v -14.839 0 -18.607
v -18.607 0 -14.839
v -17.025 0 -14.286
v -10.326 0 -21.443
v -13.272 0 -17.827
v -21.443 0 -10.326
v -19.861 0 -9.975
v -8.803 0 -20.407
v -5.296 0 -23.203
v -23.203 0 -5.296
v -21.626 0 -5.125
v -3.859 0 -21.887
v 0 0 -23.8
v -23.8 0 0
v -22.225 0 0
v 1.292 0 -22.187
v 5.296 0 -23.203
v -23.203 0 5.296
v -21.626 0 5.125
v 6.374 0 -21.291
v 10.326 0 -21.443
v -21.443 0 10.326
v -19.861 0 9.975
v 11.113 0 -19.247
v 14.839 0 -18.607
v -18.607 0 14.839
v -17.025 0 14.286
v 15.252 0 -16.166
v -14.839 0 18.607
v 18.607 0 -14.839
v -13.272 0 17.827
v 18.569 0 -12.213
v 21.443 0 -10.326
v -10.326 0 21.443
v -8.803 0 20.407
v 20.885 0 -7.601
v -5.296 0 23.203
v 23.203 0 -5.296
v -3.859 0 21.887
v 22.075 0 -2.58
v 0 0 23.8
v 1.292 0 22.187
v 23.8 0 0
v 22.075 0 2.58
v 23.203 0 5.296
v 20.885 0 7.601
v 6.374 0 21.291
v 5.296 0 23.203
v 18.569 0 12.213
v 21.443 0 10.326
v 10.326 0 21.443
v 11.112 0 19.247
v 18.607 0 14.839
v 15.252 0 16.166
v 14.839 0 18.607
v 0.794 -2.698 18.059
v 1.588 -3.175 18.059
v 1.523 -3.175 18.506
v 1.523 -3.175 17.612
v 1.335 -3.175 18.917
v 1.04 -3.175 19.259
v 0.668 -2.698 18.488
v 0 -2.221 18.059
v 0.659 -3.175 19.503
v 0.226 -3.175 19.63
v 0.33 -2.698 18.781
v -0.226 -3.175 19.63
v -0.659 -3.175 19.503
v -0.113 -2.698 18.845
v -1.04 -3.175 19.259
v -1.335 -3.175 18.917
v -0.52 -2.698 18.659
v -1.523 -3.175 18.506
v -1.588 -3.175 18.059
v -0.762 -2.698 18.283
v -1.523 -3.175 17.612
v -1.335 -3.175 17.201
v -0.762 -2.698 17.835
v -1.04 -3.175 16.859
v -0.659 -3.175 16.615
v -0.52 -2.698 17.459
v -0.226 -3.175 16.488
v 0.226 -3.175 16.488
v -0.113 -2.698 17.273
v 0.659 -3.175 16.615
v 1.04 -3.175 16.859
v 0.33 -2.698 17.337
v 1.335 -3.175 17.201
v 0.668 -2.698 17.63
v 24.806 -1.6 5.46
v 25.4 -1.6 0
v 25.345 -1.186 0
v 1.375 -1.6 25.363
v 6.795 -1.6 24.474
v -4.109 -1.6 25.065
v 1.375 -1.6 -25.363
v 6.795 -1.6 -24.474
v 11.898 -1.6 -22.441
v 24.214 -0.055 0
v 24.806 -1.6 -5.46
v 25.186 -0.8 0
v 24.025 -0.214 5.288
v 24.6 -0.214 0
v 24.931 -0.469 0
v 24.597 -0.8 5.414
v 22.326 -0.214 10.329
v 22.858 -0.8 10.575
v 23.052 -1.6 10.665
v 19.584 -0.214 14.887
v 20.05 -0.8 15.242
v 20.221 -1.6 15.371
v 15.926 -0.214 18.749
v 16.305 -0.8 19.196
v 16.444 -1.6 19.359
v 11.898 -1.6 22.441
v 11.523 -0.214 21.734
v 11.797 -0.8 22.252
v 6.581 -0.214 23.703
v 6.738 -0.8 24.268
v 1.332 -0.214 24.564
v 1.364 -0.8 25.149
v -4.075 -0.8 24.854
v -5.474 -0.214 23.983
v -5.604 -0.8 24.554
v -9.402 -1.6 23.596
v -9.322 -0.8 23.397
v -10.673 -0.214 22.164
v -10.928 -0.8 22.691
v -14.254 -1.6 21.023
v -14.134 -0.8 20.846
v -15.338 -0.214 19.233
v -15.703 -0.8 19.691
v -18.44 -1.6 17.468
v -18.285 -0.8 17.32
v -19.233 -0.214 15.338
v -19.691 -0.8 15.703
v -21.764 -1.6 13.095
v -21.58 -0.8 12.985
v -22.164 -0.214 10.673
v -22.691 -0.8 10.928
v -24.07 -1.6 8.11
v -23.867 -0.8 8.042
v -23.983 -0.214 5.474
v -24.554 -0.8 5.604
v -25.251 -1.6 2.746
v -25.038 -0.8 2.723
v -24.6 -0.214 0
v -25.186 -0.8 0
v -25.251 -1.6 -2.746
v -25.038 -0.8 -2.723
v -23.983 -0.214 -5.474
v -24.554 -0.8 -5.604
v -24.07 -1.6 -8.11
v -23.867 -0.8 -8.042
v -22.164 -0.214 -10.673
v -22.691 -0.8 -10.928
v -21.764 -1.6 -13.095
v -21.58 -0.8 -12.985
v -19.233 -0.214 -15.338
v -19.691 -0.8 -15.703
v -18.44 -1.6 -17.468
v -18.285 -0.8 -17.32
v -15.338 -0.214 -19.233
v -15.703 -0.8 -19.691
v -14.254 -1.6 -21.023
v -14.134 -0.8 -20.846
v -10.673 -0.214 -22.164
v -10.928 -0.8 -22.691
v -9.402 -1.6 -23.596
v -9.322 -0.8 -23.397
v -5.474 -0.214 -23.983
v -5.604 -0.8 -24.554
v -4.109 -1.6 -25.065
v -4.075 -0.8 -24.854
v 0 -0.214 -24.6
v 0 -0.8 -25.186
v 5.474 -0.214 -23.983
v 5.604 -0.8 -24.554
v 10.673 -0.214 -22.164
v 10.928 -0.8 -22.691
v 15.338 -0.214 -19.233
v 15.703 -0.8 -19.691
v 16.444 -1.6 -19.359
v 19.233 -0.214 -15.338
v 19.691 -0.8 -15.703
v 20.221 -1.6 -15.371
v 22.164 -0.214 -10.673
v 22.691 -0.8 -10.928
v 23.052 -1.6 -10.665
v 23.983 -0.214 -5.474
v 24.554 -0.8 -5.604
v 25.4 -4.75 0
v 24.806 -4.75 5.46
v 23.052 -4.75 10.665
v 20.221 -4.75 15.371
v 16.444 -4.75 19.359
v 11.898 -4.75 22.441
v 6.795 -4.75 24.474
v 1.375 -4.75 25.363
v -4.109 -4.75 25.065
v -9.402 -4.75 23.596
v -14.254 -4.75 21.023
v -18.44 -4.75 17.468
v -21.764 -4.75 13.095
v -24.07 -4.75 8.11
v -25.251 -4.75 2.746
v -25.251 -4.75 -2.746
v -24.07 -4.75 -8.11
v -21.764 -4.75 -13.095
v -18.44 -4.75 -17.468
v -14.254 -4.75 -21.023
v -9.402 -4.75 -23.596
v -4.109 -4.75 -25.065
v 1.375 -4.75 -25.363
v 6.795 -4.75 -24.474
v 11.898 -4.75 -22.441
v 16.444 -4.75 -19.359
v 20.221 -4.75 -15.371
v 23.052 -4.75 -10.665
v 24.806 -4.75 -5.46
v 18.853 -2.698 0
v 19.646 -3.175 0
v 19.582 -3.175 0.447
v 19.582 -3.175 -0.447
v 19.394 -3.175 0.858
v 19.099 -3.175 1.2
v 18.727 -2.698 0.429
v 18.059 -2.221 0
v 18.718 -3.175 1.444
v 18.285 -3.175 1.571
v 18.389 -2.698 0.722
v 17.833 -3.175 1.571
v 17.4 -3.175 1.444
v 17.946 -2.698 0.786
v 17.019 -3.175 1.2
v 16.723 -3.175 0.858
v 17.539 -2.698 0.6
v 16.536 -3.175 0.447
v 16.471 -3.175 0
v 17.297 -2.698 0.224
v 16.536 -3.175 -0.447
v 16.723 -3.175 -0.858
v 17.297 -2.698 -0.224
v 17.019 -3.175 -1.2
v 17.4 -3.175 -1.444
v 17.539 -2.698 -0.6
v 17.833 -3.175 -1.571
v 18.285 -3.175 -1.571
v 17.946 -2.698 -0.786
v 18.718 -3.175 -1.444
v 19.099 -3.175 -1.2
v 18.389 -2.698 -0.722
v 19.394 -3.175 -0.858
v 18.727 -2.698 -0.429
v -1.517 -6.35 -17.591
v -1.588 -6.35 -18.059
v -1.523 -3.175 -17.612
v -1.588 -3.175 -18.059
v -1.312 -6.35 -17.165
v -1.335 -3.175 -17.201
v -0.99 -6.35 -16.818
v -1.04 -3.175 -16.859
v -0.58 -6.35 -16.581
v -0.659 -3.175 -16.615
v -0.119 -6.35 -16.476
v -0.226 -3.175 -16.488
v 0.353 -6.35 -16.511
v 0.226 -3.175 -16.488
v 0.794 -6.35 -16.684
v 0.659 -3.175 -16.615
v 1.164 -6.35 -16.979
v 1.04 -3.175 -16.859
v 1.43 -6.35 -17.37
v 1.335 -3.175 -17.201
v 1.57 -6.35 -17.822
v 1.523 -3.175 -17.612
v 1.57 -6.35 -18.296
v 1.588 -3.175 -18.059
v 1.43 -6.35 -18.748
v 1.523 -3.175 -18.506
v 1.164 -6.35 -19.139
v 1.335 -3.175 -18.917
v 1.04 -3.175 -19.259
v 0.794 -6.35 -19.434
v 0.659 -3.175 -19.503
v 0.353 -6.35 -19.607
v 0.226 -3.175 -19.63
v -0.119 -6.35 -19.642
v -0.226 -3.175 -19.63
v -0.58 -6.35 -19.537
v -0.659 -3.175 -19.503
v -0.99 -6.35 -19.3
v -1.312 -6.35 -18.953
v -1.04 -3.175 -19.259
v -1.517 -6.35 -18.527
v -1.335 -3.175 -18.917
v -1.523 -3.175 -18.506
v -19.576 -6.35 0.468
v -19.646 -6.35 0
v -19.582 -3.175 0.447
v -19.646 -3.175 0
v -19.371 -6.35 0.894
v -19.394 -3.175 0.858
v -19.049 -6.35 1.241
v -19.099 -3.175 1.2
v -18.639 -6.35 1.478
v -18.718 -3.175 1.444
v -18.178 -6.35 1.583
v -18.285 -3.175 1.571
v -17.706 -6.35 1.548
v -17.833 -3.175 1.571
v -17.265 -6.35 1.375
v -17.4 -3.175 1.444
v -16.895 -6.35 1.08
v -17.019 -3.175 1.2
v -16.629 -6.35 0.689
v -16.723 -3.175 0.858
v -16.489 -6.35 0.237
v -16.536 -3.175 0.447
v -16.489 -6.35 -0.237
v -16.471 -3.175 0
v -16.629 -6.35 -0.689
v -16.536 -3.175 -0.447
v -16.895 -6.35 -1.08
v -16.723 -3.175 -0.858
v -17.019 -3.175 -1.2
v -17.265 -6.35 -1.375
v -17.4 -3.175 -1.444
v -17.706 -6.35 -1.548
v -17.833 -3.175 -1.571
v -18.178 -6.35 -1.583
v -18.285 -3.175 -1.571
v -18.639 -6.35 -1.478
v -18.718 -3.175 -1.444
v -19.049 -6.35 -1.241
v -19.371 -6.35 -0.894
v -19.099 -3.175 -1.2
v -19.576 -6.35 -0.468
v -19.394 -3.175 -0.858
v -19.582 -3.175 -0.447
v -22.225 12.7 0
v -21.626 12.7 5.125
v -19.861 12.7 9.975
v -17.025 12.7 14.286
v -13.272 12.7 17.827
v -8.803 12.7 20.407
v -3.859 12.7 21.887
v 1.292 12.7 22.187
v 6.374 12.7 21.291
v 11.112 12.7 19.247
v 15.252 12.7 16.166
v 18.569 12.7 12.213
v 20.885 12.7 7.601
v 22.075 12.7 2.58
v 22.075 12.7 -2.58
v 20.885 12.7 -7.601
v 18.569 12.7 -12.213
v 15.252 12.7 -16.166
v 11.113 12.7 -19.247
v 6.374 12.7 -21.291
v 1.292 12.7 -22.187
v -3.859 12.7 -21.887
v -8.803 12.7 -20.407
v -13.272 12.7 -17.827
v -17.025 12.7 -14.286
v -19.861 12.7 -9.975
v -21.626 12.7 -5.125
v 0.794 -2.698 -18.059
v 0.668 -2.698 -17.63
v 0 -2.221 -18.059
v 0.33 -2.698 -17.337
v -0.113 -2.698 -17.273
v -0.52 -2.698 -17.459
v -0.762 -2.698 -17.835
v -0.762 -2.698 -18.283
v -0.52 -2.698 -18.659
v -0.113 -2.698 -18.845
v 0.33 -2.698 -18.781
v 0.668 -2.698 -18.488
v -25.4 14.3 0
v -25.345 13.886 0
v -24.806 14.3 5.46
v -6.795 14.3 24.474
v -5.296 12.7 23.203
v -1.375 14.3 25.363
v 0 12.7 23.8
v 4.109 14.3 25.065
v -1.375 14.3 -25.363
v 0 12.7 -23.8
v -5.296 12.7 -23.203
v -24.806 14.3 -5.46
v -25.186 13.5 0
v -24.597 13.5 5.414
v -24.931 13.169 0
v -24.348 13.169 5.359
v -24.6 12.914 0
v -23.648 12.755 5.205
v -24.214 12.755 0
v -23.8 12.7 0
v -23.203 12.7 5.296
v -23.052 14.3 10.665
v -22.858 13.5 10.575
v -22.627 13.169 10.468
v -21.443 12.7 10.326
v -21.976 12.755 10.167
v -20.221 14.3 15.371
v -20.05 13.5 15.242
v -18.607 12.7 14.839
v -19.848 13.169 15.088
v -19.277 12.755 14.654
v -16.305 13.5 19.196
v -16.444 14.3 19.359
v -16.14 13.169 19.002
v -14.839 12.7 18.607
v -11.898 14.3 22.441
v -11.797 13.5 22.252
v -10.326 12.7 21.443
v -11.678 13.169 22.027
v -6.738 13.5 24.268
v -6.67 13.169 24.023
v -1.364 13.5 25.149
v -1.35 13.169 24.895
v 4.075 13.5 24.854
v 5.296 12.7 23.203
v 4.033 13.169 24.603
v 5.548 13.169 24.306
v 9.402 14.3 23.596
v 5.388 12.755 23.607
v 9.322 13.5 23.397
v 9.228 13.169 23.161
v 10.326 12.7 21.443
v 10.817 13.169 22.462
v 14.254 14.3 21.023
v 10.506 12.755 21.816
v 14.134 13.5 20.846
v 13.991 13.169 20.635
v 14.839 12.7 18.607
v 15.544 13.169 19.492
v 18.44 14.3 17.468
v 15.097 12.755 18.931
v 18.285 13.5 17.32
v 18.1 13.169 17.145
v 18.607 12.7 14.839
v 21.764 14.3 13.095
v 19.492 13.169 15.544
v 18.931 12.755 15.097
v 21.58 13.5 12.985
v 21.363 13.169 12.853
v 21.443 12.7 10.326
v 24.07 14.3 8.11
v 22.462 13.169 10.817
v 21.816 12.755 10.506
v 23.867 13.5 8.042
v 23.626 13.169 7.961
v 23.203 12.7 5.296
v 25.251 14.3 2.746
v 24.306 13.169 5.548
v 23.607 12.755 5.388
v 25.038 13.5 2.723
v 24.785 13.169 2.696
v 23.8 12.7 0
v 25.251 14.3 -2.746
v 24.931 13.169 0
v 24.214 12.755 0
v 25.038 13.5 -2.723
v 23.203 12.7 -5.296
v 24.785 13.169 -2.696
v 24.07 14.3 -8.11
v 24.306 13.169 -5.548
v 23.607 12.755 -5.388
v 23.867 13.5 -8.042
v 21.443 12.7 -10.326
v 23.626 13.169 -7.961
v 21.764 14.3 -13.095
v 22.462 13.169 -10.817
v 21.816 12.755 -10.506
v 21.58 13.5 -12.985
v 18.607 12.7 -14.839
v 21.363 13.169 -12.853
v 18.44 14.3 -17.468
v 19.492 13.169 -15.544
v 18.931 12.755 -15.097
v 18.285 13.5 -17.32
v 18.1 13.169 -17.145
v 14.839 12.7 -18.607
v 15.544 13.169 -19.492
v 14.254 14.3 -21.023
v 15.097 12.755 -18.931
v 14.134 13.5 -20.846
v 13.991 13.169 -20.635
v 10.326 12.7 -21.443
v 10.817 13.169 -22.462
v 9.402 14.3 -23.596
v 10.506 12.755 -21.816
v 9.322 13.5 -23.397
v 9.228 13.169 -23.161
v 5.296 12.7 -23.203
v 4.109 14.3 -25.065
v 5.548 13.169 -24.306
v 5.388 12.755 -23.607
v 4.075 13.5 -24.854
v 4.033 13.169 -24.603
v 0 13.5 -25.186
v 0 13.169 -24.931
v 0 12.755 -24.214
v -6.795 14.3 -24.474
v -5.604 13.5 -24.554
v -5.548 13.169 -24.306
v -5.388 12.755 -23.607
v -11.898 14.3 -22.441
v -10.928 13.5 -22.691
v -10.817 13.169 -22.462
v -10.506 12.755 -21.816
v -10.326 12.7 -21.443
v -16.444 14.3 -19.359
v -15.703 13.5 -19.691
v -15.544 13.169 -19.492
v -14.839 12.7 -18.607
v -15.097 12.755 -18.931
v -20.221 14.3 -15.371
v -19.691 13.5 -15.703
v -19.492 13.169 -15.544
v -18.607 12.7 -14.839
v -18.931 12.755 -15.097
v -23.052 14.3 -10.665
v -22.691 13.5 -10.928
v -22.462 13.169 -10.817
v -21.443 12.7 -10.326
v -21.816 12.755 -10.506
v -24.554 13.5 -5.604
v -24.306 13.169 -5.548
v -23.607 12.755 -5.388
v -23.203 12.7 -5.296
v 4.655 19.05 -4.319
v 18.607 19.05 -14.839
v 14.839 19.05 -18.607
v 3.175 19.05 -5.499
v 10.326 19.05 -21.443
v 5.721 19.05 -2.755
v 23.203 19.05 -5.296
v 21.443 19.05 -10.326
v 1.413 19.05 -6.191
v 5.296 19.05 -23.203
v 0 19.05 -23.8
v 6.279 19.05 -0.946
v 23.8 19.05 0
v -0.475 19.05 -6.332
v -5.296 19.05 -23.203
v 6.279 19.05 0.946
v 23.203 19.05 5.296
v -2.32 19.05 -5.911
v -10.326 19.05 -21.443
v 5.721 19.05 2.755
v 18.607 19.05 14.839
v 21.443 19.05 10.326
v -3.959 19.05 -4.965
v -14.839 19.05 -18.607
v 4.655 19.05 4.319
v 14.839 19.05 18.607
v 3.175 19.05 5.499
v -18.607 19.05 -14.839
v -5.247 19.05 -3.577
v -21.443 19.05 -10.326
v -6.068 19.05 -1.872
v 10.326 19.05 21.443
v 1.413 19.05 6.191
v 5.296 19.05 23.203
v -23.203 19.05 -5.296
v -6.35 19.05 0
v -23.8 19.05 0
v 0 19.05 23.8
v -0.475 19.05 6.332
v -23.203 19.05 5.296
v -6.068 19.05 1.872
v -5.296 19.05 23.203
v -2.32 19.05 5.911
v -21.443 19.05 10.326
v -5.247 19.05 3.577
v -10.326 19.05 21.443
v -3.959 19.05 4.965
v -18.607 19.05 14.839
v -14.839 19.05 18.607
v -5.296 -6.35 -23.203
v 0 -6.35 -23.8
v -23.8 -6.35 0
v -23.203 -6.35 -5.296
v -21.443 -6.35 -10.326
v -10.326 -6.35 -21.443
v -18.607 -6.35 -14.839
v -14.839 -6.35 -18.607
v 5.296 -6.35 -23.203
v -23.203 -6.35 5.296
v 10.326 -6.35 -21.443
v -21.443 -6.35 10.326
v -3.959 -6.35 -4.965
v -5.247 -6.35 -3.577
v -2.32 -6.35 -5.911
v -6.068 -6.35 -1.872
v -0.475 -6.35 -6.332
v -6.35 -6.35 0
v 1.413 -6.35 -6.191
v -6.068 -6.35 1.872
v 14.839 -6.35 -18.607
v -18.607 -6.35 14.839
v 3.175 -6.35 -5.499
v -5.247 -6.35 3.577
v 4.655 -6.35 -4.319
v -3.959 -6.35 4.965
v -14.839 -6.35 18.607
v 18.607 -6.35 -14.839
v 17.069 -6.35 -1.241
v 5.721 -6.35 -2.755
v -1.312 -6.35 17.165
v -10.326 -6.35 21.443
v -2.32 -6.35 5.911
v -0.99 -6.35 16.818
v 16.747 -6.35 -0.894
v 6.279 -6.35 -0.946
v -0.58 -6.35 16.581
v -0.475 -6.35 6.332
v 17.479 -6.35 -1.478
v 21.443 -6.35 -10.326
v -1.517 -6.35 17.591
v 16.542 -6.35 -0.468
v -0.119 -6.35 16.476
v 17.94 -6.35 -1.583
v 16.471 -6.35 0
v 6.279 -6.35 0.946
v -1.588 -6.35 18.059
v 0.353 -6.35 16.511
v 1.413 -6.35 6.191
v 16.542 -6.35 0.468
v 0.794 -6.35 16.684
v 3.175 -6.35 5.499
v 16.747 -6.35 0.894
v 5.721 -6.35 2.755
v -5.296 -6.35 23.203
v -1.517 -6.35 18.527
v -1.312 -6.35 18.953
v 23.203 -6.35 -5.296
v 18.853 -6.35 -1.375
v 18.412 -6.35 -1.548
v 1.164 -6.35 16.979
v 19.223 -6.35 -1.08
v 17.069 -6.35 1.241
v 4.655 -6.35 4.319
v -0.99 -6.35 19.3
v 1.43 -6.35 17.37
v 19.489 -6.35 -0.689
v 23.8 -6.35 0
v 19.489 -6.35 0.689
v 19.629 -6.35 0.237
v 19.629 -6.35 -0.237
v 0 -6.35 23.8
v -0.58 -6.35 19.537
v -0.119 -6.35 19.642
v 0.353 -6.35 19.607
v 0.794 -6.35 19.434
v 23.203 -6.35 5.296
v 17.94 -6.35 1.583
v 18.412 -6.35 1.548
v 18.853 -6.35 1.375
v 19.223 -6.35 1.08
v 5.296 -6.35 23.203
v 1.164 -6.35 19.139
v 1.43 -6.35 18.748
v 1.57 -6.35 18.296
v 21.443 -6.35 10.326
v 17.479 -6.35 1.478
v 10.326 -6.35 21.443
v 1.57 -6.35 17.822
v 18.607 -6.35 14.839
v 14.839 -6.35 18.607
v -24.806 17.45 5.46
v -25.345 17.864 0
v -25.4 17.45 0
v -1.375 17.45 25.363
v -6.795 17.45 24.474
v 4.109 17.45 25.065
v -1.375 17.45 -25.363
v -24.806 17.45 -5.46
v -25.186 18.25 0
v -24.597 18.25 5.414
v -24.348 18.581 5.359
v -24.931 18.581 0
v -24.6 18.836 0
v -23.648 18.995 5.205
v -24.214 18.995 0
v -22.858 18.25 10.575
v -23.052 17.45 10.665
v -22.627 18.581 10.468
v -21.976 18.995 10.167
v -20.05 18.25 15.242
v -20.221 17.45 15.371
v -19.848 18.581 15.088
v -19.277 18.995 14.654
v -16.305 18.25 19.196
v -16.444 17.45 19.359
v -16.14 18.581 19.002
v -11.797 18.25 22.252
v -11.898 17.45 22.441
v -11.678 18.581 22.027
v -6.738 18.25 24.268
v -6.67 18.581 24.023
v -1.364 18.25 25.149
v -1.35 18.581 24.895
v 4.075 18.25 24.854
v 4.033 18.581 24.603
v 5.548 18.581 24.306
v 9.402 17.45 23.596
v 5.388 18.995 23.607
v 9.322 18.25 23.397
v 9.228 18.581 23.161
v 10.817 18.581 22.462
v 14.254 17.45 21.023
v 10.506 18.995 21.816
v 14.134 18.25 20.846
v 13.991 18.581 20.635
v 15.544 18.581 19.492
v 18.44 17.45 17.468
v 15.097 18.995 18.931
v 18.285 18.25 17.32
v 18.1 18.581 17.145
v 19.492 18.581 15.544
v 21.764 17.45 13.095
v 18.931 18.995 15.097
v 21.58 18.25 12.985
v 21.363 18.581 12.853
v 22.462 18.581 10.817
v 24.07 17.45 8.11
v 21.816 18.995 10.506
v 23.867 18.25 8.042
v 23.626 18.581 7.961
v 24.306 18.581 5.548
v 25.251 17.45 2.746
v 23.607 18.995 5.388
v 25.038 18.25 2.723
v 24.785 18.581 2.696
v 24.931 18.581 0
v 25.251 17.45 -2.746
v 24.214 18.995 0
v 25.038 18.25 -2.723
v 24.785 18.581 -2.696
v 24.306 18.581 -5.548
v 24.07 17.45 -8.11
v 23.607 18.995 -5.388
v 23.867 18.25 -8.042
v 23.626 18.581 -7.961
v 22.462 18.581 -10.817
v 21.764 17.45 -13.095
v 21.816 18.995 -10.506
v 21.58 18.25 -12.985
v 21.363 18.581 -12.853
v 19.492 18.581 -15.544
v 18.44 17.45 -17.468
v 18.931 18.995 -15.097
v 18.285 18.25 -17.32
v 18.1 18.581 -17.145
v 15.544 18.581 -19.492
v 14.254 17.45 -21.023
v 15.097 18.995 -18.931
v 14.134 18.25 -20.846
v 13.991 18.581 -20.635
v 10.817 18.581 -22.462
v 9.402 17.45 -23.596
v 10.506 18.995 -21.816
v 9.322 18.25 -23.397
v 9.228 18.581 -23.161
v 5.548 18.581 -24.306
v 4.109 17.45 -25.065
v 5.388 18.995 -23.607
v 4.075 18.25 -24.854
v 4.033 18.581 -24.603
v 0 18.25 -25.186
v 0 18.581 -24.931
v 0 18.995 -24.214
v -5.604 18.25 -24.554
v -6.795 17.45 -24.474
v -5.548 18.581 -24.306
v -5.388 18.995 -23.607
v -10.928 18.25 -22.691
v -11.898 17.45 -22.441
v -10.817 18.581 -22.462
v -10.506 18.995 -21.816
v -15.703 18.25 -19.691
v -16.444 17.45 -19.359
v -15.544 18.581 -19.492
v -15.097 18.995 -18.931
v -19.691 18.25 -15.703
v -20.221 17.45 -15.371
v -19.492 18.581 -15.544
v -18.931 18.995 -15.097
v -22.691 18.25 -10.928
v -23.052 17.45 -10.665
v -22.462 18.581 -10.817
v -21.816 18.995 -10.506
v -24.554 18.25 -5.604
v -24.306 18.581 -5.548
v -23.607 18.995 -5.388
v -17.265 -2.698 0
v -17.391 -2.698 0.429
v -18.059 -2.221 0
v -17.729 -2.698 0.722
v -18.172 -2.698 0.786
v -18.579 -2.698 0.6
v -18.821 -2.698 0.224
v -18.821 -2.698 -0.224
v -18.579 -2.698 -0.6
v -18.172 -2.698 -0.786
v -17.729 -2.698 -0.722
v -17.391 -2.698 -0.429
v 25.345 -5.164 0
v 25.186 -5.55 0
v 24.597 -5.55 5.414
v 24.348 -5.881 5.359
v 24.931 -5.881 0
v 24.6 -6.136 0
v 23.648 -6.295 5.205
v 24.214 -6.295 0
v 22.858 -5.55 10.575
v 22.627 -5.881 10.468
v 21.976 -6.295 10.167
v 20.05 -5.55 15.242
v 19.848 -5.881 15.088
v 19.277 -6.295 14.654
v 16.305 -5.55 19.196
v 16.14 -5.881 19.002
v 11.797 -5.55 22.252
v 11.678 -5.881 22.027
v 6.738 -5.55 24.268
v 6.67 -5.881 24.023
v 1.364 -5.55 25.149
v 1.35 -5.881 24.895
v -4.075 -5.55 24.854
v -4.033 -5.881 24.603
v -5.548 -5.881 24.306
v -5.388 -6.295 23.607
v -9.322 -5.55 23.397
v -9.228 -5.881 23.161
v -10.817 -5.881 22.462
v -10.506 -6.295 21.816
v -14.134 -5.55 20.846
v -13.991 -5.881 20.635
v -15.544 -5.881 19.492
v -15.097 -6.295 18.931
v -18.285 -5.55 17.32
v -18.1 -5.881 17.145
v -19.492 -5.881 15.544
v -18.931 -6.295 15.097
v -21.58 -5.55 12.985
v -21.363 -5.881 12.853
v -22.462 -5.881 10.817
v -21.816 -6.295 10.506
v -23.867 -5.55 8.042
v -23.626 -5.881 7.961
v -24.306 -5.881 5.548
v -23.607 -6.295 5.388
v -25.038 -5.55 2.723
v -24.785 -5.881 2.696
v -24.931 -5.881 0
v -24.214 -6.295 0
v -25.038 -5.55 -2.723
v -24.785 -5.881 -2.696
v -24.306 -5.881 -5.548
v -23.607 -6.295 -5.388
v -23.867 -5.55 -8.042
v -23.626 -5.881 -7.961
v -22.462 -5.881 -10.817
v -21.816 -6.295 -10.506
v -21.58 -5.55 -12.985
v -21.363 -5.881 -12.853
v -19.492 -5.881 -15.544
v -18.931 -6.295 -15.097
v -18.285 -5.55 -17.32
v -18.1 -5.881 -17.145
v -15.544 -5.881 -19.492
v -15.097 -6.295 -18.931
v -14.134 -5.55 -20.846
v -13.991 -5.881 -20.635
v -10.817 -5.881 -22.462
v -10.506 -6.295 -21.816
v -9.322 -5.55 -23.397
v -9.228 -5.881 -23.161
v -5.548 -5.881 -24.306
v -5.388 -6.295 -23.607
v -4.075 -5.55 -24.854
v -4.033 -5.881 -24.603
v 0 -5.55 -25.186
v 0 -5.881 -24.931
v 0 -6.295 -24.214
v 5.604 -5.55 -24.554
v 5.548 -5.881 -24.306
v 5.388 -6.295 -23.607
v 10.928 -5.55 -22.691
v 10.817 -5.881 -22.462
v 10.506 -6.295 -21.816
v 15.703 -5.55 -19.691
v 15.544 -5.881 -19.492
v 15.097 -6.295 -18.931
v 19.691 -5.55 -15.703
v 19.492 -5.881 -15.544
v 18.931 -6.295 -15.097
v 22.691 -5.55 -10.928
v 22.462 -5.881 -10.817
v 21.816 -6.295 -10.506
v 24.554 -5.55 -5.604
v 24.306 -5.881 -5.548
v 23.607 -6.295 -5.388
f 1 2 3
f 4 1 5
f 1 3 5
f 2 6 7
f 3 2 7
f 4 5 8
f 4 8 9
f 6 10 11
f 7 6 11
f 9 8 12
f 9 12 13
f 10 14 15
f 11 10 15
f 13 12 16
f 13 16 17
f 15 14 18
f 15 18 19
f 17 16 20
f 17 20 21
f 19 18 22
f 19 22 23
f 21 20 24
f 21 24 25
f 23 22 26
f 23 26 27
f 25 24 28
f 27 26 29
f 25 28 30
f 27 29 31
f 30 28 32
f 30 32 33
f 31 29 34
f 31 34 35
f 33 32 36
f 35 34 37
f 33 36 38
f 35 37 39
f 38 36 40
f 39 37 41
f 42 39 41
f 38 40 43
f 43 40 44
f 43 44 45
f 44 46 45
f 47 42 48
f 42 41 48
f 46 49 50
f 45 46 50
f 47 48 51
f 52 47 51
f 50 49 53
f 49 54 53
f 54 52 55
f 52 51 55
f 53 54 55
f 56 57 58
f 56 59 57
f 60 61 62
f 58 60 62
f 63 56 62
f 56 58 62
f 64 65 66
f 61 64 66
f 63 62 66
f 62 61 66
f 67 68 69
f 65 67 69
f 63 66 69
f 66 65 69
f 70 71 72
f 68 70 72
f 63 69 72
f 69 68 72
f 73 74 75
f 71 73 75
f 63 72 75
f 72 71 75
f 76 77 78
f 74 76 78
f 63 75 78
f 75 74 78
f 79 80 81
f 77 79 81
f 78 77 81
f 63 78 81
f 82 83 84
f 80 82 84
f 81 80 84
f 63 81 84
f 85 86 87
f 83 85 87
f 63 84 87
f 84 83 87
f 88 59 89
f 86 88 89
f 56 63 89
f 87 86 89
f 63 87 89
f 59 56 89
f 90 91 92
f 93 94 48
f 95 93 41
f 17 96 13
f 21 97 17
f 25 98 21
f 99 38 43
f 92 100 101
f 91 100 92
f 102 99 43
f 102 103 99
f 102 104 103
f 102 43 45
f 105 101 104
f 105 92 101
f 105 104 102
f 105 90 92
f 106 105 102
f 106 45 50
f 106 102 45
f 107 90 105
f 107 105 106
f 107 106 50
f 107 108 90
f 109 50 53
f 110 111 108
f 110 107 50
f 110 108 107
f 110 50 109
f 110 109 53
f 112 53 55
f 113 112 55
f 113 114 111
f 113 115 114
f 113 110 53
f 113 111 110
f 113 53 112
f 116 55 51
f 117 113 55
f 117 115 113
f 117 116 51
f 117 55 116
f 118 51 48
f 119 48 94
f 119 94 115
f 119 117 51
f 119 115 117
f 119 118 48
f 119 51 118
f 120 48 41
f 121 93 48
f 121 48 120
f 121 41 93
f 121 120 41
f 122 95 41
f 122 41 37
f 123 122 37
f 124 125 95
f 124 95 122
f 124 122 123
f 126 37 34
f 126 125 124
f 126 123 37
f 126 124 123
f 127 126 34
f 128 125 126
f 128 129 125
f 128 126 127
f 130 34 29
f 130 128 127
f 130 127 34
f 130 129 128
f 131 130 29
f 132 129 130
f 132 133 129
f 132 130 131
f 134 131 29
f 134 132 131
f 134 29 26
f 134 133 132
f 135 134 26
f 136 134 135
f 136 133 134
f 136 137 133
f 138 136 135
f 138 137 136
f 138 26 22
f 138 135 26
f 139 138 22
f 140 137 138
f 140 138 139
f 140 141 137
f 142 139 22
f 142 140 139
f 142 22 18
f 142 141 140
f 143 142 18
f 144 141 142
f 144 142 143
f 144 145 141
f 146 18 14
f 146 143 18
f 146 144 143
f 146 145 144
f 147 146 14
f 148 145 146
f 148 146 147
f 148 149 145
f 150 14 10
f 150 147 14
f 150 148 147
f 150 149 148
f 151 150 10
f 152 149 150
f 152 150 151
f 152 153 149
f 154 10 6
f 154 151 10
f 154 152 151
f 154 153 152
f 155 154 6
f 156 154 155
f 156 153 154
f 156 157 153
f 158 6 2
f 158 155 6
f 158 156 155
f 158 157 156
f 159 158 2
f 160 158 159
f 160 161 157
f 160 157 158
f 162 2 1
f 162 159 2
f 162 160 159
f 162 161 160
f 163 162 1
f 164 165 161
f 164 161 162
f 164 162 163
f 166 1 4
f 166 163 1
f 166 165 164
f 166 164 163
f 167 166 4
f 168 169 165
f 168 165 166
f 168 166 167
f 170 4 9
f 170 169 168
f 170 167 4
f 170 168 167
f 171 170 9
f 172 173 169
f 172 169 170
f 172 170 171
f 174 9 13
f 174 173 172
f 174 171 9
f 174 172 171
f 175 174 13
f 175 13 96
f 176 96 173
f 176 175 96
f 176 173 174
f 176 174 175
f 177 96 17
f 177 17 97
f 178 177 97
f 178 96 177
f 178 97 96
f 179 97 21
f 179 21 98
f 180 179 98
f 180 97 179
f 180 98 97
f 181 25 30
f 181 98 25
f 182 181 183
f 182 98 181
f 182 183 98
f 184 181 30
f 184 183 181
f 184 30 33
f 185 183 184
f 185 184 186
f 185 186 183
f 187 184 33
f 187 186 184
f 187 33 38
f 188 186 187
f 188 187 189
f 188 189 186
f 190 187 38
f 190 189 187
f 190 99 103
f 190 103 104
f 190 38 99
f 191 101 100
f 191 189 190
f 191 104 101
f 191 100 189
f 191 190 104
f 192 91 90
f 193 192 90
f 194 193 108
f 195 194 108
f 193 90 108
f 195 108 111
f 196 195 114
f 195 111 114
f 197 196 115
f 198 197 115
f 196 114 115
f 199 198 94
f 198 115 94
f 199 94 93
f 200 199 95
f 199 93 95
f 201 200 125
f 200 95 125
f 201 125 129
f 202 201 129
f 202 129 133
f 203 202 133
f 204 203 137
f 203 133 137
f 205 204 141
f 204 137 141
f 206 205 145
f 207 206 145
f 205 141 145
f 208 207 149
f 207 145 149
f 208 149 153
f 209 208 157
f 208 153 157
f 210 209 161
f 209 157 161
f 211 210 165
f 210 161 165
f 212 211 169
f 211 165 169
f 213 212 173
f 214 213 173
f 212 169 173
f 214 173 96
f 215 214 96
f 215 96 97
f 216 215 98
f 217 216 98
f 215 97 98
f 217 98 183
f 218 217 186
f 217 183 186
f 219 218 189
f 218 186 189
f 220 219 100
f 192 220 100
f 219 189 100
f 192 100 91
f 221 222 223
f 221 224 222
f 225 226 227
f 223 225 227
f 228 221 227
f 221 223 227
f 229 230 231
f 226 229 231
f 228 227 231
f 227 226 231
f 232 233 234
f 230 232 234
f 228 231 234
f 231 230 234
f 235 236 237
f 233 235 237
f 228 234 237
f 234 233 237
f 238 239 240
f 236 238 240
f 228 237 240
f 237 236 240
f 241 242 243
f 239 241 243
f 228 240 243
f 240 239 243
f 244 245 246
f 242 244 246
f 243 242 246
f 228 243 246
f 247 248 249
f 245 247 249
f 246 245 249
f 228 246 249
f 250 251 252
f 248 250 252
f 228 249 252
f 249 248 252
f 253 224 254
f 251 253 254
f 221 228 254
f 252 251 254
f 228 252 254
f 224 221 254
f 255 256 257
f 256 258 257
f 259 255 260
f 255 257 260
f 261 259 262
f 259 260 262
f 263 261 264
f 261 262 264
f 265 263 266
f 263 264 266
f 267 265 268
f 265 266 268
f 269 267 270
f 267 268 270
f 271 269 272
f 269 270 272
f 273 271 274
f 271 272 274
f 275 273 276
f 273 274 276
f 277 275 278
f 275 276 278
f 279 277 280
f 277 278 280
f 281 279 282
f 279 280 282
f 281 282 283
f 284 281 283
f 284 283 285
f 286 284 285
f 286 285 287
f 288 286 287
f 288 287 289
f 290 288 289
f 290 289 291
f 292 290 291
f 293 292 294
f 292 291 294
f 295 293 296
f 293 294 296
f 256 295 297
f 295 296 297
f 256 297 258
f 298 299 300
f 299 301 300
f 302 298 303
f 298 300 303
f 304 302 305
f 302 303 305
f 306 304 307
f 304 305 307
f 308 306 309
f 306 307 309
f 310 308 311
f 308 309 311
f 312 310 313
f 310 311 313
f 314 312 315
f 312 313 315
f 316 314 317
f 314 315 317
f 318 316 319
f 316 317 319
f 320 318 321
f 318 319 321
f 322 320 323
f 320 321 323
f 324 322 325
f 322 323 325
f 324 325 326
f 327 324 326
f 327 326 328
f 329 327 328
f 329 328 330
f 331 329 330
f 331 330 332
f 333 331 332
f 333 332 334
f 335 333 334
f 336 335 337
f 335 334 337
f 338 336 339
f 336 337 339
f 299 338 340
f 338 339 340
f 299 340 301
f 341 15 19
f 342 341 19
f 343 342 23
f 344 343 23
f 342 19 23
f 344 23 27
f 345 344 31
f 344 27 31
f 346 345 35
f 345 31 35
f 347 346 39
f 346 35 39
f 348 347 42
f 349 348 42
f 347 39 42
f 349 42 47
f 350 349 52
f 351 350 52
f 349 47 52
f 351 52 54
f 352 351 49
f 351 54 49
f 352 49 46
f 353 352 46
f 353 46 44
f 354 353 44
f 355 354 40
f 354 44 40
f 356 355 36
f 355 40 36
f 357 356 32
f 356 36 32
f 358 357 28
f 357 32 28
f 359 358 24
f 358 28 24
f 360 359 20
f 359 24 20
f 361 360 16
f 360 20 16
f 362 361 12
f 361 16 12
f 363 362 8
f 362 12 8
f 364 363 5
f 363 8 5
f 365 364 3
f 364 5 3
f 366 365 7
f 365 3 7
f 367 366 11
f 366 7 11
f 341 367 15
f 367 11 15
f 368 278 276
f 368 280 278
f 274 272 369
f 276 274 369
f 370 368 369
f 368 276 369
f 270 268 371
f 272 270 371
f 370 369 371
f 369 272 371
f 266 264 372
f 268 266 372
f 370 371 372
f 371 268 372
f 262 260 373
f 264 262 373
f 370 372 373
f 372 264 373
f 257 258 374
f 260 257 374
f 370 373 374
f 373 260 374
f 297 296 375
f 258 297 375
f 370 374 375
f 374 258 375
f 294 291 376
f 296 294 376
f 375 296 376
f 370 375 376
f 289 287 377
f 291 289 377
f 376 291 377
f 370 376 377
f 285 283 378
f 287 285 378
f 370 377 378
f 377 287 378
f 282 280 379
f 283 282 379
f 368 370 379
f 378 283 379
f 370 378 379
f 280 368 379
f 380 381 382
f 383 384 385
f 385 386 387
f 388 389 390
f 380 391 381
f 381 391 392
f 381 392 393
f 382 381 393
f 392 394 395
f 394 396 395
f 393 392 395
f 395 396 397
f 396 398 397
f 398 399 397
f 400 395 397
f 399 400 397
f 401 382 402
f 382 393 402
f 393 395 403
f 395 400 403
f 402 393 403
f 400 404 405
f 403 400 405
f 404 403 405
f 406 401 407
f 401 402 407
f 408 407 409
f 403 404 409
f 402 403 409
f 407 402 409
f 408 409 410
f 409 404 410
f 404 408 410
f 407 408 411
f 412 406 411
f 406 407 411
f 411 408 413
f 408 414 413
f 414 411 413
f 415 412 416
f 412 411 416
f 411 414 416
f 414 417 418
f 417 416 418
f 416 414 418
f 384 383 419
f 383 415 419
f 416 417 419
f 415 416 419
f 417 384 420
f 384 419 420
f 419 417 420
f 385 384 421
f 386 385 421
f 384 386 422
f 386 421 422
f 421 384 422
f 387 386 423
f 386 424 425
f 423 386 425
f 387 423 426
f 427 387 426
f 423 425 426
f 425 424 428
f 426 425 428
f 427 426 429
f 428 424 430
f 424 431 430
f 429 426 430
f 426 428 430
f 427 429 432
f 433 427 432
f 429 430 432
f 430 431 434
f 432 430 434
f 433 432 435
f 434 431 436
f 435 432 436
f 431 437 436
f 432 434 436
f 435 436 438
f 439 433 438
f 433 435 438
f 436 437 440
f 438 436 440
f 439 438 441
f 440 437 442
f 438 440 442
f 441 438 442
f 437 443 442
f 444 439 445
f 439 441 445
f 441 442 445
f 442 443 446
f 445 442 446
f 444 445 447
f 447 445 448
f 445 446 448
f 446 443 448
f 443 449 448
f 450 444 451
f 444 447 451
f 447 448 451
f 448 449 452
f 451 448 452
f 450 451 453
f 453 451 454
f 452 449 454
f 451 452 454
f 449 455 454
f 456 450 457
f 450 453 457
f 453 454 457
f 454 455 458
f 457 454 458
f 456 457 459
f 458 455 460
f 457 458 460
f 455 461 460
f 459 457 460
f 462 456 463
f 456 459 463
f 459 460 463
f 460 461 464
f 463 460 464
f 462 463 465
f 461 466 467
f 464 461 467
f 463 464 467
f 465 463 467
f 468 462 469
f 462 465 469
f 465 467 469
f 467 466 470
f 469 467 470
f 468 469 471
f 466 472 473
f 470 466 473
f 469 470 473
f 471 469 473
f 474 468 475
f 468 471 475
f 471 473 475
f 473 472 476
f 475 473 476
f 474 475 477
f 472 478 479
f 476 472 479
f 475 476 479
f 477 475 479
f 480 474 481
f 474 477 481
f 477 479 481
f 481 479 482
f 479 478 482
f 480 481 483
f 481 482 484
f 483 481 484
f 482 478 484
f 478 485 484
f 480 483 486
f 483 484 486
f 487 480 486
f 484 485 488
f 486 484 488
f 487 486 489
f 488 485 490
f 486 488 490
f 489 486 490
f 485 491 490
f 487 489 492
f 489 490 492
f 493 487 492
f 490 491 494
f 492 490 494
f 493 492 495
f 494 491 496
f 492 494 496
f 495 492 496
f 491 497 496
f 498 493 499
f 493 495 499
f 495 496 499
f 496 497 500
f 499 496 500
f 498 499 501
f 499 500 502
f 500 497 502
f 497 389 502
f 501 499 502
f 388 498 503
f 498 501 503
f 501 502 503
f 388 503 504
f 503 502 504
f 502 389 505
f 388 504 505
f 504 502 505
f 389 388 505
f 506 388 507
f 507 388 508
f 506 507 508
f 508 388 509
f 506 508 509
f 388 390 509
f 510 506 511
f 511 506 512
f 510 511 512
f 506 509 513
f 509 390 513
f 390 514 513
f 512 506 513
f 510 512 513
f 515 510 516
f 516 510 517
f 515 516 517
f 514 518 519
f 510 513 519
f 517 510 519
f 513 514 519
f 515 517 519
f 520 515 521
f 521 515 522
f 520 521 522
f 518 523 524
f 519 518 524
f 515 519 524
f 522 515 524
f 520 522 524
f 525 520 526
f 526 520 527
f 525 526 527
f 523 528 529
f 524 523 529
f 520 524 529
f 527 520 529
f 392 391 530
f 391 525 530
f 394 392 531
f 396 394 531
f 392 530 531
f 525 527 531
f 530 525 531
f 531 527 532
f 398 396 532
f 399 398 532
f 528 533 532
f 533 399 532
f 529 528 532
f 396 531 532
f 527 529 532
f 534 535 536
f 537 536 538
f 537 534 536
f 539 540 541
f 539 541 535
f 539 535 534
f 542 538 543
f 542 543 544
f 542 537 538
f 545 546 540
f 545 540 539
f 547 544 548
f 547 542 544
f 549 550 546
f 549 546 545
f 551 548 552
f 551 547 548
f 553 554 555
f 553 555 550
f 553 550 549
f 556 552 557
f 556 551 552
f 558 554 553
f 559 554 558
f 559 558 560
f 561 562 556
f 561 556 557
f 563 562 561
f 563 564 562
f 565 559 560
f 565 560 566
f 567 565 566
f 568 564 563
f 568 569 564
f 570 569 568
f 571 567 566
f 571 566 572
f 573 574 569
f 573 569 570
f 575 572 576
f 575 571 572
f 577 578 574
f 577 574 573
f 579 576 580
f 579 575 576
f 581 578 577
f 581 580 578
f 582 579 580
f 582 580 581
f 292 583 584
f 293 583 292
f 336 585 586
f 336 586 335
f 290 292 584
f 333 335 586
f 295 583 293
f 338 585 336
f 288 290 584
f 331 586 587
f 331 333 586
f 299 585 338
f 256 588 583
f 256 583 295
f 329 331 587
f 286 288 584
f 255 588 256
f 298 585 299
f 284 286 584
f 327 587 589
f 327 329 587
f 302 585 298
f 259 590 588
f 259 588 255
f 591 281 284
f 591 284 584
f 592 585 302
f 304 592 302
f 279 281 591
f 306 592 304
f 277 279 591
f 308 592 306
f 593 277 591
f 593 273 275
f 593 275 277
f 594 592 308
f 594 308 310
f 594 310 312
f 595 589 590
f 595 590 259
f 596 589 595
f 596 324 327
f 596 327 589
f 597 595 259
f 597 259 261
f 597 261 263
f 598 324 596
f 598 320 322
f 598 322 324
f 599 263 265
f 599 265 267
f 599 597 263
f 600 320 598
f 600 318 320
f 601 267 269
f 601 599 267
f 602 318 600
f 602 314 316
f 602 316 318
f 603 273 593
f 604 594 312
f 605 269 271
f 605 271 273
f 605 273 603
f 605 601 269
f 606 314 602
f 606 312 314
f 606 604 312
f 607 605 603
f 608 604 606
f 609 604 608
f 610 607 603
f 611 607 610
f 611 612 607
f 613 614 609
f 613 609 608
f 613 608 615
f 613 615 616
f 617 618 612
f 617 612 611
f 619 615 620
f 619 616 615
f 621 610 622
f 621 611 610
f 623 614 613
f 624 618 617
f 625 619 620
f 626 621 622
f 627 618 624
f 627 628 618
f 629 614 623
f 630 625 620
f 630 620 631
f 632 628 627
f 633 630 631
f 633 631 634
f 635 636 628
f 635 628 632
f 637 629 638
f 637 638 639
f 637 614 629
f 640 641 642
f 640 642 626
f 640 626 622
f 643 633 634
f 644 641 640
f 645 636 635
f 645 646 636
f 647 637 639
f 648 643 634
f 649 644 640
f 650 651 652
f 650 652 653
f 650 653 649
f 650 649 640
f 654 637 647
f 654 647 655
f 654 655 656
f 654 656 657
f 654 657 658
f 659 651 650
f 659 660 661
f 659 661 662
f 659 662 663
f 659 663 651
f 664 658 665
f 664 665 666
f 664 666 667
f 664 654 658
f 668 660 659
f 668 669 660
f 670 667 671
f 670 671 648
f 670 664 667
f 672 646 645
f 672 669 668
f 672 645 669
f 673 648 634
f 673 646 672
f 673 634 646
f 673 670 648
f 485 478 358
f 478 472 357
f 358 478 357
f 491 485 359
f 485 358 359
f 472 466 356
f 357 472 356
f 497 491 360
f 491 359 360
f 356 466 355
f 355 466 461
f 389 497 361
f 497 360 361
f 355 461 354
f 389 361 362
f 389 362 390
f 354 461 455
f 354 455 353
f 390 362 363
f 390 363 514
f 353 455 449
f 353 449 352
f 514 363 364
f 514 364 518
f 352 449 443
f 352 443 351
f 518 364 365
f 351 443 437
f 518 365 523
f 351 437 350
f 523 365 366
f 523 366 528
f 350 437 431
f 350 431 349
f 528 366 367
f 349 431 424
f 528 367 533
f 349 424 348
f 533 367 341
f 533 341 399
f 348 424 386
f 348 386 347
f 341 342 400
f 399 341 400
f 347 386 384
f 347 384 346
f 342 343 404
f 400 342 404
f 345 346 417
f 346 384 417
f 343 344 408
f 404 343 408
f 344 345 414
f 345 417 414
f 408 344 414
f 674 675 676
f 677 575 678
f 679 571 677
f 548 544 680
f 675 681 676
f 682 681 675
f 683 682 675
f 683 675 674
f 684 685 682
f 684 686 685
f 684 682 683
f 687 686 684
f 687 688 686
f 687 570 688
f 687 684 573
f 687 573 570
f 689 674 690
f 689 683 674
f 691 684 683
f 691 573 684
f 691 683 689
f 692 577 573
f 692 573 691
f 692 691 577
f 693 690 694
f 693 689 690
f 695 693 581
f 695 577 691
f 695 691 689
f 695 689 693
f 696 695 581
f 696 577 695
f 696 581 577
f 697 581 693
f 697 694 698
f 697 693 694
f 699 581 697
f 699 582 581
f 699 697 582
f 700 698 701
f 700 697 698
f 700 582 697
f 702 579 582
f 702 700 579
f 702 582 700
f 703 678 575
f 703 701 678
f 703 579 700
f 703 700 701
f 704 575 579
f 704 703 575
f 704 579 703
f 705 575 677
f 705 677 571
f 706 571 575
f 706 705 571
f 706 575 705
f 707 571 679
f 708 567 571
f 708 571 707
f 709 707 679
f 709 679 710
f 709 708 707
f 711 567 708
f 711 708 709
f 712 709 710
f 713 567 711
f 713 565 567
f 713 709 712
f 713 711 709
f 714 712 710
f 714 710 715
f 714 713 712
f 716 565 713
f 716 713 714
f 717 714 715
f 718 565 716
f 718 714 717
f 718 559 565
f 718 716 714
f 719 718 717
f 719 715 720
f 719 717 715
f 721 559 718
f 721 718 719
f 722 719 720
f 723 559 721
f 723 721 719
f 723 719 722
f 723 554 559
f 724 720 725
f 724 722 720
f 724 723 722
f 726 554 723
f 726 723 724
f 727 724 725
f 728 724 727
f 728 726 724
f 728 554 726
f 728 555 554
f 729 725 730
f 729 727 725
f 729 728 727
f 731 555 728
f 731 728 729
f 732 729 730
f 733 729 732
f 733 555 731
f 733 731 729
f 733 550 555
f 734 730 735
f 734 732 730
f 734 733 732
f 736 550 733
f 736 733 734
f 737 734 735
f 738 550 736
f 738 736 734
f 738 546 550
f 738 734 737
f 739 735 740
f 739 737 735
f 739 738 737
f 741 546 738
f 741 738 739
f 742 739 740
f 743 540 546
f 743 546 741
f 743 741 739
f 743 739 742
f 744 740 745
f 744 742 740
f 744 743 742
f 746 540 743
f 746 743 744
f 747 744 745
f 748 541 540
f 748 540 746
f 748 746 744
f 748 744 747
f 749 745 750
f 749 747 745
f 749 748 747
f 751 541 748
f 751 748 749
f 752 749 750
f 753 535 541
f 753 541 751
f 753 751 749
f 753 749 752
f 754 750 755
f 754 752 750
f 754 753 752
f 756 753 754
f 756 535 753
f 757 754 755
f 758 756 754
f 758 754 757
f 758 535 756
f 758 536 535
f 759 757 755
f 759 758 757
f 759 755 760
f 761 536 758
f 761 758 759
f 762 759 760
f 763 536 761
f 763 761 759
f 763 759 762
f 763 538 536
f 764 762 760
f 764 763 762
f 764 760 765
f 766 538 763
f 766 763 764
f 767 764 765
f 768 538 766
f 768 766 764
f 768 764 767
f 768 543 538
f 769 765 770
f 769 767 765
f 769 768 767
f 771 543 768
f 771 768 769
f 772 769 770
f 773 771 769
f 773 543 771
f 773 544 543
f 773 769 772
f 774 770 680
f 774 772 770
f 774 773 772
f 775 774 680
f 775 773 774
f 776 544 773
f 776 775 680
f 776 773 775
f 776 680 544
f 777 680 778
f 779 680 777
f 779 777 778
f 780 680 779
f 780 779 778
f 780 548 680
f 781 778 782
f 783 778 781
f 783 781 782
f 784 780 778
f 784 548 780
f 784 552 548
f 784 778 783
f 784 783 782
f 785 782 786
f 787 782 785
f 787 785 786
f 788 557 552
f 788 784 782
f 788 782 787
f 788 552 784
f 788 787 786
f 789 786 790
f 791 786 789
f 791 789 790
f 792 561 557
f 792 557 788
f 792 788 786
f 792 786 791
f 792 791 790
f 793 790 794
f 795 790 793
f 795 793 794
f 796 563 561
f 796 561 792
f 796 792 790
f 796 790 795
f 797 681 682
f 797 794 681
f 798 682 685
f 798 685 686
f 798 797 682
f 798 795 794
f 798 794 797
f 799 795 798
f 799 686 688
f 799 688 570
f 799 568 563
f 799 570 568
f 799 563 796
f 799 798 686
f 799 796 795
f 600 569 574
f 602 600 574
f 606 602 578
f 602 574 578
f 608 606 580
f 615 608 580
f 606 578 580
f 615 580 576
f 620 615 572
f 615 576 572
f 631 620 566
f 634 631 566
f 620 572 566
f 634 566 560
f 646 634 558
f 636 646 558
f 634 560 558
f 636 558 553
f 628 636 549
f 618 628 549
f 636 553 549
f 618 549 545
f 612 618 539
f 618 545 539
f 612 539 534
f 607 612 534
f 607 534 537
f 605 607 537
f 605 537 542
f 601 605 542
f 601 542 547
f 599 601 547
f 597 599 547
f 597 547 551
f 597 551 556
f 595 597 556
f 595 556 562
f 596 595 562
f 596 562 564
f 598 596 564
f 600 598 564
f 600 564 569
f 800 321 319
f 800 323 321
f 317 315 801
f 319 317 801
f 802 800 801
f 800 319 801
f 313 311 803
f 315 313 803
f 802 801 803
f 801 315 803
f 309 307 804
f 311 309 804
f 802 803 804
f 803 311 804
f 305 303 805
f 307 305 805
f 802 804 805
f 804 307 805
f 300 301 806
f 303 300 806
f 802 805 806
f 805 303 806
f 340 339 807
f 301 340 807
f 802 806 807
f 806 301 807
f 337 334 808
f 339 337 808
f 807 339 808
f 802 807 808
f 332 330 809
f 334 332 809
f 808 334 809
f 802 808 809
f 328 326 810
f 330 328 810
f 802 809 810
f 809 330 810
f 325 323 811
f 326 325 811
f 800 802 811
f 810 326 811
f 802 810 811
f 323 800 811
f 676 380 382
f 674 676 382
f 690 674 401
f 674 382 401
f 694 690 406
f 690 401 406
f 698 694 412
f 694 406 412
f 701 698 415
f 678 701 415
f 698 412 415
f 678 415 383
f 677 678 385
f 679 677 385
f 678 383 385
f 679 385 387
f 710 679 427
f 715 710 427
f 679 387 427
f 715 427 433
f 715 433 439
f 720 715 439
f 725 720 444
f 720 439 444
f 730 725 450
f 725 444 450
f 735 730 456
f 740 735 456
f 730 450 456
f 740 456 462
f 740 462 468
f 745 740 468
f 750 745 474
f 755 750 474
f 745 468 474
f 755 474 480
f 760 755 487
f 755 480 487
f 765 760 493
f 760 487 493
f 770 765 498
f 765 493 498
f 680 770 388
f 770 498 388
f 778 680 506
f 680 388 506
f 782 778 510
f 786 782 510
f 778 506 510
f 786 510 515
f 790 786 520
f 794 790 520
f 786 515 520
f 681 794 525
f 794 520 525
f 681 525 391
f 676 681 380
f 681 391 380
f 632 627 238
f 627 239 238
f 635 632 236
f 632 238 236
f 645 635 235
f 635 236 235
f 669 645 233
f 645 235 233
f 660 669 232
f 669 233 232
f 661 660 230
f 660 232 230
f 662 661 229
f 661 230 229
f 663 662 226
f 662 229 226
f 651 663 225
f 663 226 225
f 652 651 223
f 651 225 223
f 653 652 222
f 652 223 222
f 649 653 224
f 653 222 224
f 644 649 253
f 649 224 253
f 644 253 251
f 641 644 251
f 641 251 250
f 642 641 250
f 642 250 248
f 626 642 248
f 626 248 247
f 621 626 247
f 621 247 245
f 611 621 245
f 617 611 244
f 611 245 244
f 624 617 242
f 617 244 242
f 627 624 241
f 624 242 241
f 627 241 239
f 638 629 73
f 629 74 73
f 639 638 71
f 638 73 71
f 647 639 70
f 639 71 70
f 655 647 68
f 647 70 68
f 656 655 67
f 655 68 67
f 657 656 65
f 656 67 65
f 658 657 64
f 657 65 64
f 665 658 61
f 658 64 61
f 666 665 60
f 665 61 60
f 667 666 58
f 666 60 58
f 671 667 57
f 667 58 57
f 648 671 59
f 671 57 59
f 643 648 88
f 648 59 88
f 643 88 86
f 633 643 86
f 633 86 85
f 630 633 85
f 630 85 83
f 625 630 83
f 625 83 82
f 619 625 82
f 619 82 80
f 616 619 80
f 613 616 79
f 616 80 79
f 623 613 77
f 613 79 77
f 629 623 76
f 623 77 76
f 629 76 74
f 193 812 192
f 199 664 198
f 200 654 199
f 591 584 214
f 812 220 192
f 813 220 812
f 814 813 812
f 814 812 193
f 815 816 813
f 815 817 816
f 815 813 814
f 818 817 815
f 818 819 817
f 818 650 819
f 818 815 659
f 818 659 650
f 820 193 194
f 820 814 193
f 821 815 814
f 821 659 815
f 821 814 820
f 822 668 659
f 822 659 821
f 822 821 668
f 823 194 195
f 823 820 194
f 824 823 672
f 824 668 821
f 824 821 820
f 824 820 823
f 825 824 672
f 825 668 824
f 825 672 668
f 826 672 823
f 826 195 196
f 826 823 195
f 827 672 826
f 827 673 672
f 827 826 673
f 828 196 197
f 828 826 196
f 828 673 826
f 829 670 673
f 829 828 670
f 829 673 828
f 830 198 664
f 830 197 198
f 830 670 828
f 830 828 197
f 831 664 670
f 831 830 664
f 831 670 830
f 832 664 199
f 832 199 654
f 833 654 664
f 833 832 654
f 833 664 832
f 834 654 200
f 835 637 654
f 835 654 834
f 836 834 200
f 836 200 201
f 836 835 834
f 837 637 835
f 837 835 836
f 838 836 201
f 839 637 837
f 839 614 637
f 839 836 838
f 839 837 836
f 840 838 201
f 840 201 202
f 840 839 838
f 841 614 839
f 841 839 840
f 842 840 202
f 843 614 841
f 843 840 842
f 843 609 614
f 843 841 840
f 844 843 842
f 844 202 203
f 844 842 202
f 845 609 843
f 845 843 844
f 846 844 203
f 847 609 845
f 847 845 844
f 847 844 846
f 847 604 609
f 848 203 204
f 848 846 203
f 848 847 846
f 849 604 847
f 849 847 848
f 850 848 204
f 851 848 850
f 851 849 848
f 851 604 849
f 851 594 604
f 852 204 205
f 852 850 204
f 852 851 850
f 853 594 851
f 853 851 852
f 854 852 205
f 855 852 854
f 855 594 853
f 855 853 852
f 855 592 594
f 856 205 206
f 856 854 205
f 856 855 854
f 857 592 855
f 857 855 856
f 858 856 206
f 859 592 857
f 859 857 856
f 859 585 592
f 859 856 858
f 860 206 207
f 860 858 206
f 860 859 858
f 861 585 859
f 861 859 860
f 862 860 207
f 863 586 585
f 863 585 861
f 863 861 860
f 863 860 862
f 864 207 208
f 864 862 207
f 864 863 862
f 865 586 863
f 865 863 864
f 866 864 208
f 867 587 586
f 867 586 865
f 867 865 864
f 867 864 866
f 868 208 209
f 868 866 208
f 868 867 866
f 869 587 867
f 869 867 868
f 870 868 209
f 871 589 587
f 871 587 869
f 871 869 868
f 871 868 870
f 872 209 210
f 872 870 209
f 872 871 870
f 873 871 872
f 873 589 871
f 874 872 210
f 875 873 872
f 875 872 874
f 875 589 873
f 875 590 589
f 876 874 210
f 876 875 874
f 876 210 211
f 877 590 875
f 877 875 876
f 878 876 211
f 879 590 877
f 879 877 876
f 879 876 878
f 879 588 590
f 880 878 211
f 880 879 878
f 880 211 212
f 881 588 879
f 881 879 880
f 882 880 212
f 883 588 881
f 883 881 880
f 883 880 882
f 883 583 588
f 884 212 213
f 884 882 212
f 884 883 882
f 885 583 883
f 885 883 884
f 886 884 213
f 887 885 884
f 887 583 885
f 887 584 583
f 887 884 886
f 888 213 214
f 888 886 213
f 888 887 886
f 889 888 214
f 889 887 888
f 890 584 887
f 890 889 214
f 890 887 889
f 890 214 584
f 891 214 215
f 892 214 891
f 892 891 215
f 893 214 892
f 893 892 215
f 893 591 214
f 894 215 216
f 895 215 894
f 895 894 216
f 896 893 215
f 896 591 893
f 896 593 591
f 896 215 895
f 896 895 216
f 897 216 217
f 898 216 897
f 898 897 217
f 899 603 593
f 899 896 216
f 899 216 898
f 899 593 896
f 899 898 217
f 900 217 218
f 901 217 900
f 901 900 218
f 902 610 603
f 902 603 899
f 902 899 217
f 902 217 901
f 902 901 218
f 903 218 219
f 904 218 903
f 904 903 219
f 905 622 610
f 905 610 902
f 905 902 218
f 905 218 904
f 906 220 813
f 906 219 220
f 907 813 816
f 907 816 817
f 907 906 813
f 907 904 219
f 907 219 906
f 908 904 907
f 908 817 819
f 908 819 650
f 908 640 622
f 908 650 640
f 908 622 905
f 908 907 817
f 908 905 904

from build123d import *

# Parameters (mm, degrees)
F0_R     = 25.4
F1_DEPTH = 6.35
F2_R     = 22.225
F3_DEPTH = 12.7
F4_R     = 25.4
F5_DEPTH = 6.35
F6_R     = 1.6002
F8_D     = 3.175
F8_DEPTH = 3.175
F8_TIP   = 0.9538662327
F10_D    = 12.7


with BuildPart() as f1:
    # F0 (on Front) → F1 (new body)
    with BuildSketch(Plane.XZ):
        Circle(F0_R)
    extrude(amount=F1_DEPTH)

    # F2 (on face) → F3 (join)
    with BuildSketch(Plane(origin=(0, 0, 0), x_dir=(-1, 0, 0), z_dir=(0, 1, 0))):
        Circle(F2_R)
    extrude(amount=F3_DEPTH)

    # F4 (on face) → F5 (join)
    with BuildSketch(Plane(origin=(0, 12.7, 0), x_dir=(-1, 0, 0), z_dir=(0, 1, 0))):
        Circle(F4_R)
    extrude(amount=F5_DEPTH)

    # F6
    f6_edges = [f1.edges().sort_by_distance(p)[0] for p in [
        (-25.4, -6.35, 0),
        (25.4, 19.05, 0),
        (-25.4, 0, 0),
        (25.4, 12.7, 0),
    ]]
    fillet(f6_edges, radius=F6_R)

    # F8
    with Locations(Plane.XZ.offset(6.35)):
        with Locations((0, 18.0589817464), (-18.0589817464, 0), (0, -18.0589817464), (18.0589817464, 0)):
            Hole(F8_D / 2, depth=F8_DEPTH)
            with Locations((0, 0, -(F8_DEPTH + F8_TIP / 2))):  # 118° drill point
                Cone(0, F8_D / 2, F8_TIP, mode=Mode.SUBTRACT)

    # F10 (through all)
    with Locations(Plane.XZ.offset(6.35)):
        with Locations((0, 0)):
            Hole(F10_D / 2)


solid = f1.part
